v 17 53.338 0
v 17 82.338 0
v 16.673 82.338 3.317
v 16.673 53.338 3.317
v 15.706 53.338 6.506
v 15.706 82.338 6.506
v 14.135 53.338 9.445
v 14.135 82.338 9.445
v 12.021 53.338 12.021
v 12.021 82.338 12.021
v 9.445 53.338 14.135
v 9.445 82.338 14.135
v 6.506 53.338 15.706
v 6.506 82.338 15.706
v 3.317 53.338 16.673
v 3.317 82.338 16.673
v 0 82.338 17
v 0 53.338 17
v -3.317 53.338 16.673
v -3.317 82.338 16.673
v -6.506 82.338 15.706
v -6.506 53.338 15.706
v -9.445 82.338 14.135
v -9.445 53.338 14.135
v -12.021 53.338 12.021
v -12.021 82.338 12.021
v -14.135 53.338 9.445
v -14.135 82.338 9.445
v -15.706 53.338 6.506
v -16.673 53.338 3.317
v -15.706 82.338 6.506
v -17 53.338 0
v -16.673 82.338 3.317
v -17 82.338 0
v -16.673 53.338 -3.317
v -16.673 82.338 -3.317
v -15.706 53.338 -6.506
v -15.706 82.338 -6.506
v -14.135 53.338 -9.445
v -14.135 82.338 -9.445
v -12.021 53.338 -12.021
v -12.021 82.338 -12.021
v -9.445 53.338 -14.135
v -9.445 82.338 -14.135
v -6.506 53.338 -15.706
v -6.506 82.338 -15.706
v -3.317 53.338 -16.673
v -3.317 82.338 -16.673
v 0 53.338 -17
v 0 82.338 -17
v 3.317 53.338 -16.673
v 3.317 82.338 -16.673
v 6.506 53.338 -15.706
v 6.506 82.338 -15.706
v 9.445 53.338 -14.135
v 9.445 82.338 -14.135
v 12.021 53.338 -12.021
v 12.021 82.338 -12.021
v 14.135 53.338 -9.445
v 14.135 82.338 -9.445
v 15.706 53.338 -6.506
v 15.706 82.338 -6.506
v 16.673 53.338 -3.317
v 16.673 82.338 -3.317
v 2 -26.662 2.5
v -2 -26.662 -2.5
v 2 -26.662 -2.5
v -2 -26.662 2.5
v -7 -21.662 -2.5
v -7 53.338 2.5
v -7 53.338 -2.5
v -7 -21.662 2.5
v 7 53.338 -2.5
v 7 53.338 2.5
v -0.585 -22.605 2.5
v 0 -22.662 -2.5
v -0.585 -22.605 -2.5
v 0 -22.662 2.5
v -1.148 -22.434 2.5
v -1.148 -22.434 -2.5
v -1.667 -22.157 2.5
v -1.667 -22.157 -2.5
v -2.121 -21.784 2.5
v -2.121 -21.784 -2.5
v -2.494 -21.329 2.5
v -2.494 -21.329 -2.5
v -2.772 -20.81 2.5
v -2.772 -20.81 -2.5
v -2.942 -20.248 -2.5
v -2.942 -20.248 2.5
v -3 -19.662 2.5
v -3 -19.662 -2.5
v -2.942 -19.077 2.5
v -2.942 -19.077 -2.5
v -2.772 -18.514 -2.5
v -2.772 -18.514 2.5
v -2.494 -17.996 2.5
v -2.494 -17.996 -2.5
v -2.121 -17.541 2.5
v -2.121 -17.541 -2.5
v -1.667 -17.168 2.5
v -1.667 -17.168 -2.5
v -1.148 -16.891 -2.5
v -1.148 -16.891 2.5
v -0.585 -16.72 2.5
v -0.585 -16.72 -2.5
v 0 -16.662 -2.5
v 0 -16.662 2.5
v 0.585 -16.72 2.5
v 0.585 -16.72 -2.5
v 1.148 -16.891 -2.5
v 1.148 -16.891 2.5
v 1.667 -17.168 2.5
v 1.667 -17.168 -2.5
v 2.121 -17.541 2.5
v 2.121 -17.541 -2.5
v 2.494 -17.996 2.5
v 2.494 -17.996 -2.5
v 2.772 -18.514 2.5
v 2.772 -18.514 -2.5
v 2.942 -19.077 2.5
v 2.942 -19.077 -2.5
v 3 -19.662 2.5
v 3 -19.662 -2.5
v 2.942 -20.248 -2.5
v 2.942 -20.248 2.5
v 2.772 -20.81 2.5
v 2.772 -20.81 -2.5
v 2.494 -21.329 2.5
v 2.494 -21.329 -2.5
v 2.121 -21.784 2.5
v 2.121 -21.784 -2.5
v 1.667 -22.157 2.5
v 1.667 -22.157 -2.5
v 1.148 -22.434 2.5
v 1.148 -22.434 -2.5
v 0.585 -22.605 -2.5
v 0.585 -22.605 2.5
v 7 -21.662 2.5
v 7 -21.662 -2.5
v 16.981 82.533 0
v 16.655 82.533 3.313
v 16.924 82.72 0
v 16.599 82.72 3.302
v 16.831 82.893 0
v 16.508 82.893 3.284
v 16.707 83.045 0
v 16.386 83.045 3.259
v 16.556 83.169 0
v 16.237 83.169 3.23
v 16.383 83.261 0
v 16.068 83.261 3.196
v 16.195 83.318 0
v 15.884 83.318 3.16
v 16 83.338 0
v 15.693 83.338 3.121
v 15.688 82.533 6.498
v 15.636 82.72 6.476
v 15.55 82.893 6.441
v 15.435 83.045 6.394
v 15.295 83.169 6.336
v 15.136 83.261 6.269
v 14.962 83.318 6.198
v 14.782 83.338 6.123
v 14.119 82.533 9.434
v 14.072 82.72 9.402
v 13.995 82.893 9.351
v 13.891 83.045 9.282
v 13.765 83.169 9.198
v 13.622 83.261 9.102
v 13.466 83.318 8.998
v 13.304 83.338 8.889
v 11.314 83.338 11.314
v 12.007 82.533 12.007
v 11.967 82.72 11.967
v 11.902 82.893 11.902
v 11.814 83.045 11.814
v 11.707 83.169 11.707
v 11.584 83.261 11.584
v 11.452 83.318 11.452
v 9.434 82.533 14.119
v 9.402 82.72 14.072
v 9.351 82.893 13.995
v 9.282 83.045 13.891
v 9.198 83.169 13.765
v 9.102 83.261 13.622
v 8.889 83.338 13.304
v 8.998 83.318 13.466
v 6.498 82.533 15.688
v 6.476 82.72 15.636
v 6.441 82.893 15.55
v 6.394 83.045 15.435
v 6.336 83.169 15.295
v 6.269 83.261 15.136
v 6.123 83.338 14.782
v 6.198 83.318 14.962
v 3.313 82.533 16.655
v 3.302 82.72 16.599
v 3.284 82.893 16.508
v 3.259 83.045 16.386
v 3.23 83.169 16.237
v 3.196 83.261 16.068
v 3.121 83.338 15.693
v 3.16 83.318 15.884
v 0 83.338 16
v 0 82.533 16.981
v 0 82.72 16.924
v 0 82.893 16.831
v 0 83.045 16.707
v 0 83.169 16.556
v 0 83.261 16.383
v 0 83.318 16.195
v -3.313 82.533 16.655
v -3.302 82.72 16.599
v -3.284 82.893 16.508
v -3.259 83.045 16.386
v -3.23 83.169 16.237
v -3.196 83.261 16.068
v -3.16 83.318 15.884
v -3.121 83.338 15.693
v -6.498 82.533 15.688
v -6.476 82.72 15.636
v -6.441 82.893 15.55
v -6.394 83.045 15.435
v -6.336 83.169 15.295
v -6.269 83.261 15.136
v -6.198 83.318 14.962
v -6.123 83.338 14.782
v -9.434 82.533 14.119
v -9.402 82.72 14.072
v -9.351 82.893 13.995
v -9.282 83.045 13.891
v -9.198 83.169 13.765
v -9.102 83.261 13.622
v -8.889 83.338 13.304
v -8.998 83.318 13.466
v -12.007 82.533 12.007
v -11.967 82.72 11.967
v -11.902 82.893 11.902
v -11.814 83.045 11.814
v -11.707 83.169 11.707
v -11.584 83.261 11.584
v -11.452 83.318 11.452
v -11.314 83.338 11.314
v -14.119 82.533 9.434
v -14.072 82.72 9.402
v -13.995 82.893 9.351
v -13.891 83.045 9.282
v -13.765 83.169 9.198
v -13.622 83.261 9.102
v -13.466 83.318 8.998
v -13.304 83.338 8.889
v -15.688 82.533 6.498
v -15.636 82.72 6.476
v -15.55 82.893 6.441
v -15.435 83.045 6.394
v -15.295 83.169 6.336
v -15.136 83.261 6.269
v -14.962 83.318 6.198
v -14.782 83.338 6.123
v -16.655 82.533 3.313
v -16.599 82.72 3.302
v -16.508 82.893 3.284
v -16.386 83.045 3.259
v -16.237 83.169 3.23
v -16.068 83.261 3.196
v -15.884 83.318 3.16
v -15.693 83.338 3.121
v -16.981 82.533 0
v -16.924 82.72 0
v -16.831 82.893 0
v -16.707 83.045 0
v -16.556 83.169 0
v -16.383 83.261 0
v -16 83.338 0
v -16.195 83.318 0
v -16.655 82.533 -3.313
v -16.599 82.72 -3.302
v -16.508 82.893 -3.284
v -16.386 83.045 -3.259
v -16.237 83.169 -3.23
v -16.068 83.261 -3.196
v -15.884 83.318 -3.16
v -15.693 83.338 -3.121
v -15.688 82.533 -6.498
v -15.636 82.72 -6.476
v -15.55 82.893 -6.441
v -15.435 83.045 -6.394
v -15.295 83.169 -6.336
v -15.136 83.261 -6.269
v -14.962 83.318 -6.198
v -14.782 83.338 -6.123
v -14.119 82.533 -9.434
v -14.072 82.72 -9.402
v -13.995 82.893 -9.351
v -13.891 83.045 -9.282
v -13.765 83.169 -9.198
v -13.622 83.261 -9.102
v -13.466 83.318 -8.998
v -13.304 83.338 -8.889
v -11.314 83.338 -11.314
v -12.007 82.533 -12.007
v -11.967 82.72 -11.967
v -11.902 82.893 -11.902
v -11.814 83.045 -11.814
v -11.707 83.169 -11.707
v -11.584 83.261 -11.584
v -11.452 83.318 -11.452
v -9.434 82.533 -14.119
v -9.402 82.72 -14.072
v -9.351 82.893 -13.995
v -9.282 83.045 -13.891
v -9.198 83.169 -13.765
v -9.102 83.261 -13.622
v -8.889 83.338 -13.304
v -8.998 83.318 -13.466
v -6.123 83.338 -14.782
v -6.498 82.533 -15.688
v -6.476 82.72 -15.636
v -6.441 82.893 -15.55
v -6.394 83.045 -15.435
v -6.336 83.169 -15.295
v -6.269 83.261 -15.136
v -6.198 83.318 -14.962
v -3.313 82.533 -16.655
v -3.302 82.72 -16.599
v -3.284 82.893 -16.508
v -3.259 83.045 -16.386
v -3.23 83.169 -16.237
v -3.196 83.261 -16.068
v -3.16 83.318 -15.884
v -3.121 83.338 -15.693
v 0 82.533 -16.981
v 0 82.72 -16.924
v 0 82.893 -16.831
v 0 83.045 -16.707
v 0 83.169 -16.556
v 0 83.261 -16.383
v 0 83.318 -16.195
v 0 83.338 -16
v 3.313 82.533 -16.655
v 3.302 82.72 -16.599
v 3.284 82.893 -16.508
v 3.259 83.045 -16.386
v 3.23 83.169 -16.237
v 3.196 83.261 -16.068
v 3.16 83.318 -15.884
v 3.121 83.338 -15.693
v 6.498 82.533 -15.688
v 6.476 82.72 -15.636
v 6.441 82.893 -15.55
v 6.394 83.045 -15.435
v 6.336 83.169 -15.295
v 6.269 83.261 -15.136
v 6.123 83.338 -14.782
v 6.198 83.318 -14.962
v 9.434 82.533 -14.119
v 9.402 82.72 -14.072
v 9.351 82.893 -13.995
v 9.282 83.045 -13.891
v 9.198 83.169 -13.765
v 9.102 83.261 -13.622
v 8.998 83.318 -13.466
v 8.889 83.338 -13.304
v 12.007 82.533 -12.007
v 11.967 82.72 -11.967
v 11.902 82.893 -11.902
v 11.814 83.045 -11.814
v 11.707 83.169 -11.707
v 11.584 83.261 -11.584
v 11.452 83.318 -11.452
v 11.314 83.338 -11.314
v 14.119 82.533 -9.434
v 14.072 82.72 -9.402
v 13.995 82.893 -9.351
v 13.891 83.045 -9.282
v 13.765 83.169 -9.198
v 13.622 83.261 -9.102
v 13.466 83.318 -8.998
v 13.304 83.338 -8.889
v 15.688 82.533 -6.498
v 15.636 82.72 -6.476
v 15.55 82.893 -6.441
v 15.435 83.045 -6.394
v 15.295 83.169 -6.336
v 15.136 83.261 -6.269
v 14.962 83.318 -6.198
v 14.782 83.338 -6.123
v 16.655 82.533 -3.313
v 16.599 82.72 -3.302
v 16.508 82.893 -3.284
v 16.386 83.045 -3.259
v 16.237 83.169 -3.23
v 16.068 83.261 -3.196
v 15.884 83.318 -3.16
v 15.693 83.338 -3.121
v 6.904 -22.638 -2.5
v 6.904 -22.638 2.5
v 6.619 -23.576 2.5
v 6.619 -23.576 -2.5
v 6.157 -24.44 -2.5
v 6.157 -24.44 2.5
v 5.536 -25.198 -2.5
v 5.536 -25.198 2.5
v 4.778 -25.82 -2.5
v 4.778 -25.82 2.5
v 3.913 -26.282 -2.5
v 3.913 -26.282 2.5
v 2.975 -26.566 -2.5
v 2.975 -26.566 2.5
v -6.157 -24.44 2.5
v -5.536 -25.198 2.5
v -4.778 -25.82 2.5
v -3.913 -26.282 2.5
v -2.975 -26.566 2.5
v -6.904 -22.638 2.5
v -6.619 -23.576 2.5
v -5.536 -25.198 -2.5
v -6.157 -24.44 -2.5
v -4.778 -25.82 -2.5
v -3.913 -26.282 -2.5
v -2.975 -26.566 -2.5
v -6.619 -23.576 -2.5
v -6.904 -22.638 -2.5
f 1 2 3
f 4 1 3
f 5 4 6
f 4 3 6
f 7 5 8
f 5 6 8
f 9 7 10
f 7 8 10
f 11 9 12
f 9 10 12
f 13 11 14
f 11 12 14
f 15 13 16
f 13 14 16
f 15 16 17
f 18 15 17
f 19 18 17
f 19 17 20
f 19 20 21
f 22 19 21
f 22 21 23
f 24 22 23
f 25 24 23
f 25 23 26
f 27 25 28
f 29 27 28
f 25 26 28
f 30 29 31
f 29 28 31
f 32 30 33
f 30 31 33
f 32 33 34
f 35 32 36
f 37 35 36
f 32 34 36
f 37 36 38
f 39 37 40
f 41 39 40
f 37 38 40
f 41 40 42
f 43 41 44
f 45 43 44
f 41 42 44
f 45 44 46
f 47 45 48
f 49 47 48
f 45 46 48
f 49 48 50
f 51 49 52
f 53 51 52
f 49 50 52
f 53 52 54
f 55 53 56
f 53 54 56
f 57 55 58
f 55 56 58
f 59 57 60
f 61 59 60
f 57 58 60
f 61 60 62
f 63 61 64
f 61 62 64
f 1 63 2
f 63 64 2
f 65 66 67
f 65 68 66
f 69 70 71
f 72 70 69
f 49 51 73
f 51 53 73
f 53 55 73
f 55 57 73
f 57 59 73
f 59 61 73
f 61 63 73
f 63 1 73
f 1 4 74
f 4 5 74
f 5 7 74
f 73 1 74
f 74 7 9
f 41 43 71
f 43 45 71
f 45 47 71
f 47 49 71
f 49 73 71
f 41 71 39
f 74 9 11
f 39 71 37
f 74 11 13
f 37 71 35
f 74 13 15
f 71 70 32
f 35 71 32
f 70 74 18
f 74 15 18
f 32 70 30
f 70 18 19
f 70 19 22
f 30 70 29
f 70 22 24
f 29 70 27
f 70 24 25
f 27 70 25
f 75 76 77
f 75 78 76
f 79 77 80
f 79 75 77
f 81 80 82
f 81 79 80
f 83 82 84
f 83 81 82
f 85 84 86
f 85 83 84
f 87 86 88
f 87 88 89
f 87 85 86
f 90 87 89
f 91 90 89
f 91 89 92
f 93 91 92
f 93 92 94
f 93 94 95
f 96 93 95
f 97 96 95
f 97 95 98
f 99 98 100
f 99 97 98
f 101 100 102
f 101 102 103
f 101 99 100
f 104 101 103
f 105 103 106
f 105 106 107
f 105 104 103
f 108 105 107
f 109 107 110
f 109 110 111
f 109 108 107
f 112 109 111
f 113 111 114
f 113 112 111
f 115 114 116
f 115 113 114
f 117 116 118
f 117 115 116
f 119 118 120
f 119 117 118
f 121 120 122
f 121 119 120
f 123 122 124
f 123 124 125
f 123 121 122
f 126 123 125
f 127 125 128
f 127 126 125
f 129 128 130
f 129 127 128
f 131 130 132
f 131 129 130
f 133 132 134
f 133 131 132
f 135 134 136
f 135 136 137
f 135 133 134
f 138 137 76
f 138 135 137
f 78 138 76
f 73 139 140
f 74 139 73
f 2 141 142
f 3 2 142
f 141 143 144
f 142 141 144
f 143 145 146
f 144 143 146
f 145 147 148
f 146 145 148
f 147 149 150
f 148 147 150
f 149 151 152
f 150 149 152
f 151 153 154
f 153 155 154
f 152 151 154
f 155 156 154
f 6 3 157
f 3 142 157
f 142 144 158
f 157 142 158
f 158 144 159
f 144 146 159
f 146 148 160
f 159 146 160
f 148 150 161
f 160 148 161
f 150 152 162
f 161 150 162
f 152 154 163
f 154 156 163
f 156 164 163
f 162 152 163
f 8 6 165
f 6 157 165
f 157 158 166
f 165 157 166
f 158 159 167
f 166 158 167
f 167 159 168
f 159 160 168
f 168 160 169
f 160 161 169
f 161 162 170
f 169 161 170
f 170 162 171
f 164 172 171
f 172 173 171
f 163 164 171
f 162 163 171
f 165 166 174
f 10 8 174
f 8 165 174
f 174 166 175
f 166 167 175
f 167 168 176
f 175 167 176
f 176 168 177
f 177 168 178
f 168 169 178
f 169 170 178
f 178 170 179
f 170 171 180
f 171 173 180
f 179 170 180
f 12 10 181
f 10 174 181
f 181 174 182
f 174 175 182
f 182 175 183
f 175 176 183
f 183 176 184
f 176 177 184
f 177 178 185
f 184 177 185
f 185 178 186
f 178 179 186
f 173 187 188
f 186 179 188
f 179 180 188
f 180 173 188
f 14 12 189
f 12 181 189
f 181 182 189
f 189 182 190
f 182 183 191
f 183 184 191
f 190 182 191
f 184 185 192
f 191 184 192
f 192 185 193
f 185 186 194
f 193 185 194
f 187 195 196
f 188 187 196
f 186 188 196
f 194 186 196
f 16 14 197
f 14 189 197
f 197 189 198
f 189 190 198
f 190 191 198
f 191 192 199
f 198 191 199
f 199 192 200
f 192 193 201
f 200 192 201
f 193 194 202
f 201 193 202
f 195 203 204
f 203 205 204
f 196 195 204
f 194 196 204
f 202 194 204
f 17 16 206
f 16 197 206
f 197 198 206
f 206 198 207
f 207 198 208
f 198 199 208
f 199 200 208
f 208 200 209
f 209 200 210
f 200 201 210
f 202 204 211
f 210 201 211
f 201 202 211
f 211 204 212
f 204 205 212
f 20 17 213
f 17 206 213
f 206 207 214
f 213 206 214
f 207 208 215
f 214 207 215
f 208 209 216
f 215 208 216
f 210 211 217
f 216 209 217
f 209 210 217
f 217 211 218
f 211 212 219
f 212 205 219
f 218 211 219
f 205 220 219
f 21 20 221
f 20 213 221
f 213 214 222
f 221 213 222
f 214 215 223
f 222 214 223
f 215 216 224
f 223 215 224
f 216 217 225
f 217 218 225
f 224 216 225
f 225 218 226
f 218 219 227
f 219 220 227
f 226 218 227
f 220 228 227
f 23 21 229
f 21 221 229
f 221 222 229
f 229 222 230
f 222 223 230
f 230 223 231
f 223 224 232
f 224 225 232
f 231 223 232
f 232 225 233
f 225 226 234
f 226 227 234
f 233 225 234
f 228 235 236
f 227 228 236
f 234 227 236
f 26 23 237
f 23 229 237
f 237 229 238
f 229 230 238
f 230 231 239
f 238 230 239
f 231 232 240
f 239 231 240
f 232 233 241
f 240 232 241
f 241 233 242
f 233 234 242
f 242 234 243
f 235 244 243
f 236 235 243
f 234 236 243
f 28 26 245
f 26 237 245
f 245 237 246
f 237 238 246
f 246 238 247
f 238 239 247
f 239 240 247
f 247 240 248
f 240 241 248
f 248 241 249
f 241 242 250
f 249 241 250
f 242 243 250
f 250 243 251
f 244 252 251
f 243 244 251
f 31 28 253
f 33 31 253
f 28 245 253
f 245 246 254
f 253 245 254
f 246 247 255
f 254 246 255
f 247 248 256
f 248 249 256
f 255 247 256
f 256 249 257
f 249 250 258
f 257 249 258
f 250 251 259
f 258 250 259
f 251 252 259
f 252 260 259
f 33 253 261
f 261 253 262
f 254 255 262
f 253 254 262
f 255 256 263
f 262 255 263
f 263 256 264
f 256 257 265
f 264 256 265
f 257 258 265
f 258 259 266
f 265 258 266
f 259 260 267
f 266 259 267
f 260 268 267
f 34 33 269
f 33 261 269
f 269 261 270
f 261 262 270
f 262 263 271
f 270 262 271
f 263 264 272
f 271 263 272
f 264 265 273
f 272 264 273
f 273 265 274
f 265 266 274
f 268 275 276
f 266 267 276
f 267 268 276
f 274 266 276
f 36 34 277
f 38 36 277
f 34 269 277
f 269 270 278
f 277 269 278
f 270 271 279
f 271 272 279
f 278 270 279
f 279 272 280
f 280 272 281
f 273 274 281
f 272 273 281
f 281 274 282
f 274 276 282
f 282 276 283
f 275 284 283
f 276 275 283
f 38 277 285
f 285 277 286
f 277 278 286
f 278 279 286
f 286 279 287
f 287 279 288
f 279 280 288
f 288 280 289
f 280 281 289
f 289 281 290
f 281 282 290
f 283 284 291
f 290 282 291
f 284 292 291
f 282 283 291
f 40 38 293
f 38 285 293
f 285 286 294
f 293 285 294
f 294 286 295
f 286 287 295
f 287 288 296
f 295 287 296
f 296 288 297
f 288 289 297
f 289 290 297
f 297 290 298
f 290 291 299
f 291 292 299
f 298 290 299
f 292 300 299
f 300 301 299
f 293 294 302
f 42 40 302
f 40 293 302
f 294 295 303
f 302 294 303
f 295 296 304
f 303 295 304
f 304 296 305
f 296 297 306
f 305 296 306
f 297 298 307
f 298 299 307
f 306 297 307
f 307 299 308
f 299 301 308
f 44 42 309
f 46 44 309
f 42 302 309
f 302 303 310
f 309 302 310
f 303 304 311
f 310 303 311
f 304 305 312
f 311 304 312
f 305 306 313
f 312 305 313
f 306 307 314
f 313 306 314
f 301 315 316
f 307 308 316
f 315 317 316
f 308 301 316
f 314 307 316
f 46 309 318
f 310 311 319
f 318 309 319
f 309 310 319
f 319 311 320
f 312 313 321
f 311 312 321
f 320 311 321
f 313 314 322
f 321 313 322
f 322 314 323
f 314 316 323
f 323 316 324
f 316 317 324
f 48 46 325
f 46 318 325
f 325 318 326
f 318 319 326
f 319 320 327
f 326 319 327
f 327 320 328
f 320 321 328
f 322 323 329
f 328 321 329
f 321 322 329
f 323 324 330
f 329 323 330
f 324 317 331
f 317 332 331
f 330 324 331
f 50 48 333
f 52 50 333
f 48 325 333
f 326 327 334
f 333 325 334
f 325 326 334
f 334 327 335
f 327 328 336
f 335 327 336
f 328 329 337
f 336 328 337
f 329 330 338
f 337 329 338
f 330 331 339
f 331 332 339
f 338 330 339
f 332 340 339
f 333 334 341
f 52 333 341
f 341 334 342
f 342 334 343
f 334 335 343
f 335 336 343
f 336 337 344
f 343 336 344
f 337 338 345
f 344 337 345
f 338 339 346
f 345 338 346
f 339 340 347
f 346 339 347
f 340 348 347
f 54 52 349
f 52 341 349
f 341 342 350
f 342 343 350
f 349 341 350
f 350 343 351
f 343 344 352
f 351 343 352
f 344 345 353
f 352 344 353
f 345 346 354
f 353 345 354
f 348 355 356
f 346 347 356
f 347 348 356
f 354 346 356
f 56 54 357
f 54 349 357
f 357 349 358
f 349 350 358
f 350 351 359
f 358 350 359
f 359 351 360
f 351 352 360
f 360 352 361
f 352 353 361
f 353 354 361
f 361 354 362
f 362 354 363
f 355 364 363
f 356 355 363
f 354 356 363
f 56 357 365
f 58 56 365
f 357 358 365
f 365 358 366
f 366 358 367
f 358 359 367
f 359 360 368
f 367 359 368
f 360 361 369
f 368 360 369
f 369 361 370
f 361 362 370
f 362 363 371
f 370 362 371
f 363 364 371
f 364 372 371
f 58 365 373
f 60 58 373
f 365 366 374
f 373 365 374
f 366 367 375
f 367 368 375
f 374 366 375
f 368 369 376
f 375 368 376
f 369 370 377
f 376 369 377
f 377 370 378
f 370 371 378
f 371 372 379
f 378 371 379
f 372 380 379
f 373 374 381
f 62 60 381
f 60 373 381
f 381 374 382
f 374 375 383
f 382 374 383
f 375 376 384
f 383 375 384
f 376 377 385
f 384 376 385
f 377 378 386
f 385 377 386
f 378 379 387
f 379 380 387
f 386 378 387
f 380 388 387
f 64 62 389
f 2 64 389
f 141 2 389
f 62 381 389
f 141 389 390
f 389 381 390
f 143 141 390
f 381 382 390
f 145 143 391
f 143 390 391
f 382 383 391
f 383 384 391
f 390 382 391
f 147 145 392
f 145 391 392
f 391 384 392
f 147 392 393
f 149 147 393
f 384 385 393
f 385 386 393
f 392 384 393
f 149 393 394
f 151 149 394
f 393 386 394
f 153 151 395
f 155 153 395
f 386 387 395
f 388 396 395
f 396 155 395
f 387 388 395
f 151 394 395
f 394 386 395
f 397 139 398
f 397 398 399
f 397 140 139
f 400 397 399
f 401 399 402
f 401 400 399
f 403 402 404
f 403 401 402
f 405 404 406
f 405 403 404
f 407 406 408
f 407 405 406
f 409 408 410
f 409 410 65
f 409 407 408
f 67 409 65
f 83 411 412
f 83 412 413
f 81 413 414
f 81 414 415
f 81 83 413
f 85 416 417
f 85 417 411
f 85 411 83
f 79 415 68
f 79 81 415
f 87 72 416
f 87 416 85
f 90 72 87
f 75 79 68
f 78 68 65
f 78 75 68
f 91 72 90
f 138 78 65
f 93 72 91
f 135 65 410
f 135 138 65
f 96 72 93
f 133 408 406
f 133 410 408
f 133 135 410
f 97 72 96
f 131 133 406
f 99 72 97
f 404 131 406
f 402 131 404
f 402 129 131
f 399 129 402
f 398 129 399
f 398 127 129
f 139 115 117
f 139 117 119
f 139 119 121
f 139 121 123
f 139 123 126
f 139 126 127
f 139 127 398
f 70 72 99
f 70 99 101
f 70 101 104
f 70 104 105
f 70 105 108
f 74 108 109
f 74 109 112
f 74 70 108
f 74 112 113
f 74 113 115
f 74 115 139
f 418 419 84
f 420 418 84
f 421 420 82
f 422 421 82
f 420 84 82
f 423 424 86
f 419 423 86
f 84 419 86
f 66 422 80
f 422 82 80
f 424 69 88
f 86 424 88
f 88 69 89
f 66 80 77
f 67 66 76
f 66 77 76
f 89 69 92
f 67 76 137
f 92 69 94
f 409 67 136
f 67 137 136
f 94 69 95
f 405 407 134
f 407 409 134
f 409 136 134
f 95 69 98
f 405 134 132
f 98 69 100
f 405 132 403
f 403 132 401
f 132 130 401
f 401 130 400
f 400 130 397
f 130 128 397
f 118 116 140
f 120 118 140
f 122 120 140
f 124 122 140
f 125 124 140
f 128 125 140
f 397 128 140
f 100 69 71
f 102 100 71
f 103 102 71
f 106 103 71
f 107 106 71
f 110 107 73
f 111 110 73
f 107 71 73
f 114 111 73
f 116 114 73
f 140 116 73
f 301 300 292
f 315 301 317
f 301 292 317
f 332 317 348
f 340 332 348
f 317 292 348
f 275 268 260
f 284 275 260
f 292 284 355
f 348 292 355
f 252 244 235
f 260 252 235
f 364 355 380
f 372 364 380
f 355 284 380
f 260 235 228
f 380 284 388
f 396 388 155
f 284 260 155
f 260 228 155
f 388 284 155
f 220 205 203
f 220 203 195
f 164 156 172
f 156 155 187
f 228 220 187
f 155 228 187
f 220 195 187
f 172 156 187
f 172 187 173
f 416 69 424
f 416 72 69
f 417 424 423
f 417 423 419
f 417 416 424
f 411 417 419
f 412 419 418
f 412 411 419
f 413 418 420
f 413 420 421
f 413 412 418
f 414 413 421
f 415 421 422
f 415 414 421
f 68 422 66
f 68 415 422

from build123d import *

# Parameters (mm, degrees)
F2_DEPTH = 2.5
F3_R     = 5
F4_R     = 1


with BuildPart() as f1:
    # F0 (on Top) → F1 (revolve)
    with BuildSketch(Plane.XY):
        Polygon((17, 83.3376), (0, 83.3376), (0, 53.3376), (7, 53.3376), (17, 53.3376), align=None)
    revolve(axis=Axis((0, 2.958108, 0), (0, -1, 0)))

    # F0 (on Top) → F2 (join, symmetric)
    with BuildSketch(Plane.XY):
        with BuildLine():
            Line((7, 53.3376), (0, 53.3376))
            Line((0, 53.3376), (0, -16.6624))
            ThreePointArc((0, -16.6624), (3, -19.6624), (0, -22.6624))
            Line((0, -22.6624), (0, -26.6624))
            Line((0, -26.6624), (7, -26.6624))
            Line((7, -26.6624), (7, 53.3376))
        make_face()
        with BuildLine():
            Line((0, -16.6624), (0, 53.3376))
            Line((0, 53.3376), (-7, 53.3376))
            Line((-7, 53.3376), (-7, -26.6624))
            Line((-7, -26.6624), (0, -26.6624))
            Line((0, -26.6624), (0, -22.6624))
            ThreePointArc((0, -22.6624), (-3, -19.6624), (0, -16.6624))
        make_face()
    extrude(amount=F2_DEPTH, both=True)

    # F3
    f3_edges = [f1.edges().sort_by_distance(p)[0] for p in [
        (7, -26.6624, 0),
        (-7, -26.6624, 0),
    ]]
    fillet(f3_edges, radius=F3_R)

    # F4
    f4_edges = [f1.edges().sort_by_distance(p)[0] for p in [
        (-17, 83.3376, 0),
    ]]
    fillet(f4_edges, radius=F4_R)


solid = f1.part
